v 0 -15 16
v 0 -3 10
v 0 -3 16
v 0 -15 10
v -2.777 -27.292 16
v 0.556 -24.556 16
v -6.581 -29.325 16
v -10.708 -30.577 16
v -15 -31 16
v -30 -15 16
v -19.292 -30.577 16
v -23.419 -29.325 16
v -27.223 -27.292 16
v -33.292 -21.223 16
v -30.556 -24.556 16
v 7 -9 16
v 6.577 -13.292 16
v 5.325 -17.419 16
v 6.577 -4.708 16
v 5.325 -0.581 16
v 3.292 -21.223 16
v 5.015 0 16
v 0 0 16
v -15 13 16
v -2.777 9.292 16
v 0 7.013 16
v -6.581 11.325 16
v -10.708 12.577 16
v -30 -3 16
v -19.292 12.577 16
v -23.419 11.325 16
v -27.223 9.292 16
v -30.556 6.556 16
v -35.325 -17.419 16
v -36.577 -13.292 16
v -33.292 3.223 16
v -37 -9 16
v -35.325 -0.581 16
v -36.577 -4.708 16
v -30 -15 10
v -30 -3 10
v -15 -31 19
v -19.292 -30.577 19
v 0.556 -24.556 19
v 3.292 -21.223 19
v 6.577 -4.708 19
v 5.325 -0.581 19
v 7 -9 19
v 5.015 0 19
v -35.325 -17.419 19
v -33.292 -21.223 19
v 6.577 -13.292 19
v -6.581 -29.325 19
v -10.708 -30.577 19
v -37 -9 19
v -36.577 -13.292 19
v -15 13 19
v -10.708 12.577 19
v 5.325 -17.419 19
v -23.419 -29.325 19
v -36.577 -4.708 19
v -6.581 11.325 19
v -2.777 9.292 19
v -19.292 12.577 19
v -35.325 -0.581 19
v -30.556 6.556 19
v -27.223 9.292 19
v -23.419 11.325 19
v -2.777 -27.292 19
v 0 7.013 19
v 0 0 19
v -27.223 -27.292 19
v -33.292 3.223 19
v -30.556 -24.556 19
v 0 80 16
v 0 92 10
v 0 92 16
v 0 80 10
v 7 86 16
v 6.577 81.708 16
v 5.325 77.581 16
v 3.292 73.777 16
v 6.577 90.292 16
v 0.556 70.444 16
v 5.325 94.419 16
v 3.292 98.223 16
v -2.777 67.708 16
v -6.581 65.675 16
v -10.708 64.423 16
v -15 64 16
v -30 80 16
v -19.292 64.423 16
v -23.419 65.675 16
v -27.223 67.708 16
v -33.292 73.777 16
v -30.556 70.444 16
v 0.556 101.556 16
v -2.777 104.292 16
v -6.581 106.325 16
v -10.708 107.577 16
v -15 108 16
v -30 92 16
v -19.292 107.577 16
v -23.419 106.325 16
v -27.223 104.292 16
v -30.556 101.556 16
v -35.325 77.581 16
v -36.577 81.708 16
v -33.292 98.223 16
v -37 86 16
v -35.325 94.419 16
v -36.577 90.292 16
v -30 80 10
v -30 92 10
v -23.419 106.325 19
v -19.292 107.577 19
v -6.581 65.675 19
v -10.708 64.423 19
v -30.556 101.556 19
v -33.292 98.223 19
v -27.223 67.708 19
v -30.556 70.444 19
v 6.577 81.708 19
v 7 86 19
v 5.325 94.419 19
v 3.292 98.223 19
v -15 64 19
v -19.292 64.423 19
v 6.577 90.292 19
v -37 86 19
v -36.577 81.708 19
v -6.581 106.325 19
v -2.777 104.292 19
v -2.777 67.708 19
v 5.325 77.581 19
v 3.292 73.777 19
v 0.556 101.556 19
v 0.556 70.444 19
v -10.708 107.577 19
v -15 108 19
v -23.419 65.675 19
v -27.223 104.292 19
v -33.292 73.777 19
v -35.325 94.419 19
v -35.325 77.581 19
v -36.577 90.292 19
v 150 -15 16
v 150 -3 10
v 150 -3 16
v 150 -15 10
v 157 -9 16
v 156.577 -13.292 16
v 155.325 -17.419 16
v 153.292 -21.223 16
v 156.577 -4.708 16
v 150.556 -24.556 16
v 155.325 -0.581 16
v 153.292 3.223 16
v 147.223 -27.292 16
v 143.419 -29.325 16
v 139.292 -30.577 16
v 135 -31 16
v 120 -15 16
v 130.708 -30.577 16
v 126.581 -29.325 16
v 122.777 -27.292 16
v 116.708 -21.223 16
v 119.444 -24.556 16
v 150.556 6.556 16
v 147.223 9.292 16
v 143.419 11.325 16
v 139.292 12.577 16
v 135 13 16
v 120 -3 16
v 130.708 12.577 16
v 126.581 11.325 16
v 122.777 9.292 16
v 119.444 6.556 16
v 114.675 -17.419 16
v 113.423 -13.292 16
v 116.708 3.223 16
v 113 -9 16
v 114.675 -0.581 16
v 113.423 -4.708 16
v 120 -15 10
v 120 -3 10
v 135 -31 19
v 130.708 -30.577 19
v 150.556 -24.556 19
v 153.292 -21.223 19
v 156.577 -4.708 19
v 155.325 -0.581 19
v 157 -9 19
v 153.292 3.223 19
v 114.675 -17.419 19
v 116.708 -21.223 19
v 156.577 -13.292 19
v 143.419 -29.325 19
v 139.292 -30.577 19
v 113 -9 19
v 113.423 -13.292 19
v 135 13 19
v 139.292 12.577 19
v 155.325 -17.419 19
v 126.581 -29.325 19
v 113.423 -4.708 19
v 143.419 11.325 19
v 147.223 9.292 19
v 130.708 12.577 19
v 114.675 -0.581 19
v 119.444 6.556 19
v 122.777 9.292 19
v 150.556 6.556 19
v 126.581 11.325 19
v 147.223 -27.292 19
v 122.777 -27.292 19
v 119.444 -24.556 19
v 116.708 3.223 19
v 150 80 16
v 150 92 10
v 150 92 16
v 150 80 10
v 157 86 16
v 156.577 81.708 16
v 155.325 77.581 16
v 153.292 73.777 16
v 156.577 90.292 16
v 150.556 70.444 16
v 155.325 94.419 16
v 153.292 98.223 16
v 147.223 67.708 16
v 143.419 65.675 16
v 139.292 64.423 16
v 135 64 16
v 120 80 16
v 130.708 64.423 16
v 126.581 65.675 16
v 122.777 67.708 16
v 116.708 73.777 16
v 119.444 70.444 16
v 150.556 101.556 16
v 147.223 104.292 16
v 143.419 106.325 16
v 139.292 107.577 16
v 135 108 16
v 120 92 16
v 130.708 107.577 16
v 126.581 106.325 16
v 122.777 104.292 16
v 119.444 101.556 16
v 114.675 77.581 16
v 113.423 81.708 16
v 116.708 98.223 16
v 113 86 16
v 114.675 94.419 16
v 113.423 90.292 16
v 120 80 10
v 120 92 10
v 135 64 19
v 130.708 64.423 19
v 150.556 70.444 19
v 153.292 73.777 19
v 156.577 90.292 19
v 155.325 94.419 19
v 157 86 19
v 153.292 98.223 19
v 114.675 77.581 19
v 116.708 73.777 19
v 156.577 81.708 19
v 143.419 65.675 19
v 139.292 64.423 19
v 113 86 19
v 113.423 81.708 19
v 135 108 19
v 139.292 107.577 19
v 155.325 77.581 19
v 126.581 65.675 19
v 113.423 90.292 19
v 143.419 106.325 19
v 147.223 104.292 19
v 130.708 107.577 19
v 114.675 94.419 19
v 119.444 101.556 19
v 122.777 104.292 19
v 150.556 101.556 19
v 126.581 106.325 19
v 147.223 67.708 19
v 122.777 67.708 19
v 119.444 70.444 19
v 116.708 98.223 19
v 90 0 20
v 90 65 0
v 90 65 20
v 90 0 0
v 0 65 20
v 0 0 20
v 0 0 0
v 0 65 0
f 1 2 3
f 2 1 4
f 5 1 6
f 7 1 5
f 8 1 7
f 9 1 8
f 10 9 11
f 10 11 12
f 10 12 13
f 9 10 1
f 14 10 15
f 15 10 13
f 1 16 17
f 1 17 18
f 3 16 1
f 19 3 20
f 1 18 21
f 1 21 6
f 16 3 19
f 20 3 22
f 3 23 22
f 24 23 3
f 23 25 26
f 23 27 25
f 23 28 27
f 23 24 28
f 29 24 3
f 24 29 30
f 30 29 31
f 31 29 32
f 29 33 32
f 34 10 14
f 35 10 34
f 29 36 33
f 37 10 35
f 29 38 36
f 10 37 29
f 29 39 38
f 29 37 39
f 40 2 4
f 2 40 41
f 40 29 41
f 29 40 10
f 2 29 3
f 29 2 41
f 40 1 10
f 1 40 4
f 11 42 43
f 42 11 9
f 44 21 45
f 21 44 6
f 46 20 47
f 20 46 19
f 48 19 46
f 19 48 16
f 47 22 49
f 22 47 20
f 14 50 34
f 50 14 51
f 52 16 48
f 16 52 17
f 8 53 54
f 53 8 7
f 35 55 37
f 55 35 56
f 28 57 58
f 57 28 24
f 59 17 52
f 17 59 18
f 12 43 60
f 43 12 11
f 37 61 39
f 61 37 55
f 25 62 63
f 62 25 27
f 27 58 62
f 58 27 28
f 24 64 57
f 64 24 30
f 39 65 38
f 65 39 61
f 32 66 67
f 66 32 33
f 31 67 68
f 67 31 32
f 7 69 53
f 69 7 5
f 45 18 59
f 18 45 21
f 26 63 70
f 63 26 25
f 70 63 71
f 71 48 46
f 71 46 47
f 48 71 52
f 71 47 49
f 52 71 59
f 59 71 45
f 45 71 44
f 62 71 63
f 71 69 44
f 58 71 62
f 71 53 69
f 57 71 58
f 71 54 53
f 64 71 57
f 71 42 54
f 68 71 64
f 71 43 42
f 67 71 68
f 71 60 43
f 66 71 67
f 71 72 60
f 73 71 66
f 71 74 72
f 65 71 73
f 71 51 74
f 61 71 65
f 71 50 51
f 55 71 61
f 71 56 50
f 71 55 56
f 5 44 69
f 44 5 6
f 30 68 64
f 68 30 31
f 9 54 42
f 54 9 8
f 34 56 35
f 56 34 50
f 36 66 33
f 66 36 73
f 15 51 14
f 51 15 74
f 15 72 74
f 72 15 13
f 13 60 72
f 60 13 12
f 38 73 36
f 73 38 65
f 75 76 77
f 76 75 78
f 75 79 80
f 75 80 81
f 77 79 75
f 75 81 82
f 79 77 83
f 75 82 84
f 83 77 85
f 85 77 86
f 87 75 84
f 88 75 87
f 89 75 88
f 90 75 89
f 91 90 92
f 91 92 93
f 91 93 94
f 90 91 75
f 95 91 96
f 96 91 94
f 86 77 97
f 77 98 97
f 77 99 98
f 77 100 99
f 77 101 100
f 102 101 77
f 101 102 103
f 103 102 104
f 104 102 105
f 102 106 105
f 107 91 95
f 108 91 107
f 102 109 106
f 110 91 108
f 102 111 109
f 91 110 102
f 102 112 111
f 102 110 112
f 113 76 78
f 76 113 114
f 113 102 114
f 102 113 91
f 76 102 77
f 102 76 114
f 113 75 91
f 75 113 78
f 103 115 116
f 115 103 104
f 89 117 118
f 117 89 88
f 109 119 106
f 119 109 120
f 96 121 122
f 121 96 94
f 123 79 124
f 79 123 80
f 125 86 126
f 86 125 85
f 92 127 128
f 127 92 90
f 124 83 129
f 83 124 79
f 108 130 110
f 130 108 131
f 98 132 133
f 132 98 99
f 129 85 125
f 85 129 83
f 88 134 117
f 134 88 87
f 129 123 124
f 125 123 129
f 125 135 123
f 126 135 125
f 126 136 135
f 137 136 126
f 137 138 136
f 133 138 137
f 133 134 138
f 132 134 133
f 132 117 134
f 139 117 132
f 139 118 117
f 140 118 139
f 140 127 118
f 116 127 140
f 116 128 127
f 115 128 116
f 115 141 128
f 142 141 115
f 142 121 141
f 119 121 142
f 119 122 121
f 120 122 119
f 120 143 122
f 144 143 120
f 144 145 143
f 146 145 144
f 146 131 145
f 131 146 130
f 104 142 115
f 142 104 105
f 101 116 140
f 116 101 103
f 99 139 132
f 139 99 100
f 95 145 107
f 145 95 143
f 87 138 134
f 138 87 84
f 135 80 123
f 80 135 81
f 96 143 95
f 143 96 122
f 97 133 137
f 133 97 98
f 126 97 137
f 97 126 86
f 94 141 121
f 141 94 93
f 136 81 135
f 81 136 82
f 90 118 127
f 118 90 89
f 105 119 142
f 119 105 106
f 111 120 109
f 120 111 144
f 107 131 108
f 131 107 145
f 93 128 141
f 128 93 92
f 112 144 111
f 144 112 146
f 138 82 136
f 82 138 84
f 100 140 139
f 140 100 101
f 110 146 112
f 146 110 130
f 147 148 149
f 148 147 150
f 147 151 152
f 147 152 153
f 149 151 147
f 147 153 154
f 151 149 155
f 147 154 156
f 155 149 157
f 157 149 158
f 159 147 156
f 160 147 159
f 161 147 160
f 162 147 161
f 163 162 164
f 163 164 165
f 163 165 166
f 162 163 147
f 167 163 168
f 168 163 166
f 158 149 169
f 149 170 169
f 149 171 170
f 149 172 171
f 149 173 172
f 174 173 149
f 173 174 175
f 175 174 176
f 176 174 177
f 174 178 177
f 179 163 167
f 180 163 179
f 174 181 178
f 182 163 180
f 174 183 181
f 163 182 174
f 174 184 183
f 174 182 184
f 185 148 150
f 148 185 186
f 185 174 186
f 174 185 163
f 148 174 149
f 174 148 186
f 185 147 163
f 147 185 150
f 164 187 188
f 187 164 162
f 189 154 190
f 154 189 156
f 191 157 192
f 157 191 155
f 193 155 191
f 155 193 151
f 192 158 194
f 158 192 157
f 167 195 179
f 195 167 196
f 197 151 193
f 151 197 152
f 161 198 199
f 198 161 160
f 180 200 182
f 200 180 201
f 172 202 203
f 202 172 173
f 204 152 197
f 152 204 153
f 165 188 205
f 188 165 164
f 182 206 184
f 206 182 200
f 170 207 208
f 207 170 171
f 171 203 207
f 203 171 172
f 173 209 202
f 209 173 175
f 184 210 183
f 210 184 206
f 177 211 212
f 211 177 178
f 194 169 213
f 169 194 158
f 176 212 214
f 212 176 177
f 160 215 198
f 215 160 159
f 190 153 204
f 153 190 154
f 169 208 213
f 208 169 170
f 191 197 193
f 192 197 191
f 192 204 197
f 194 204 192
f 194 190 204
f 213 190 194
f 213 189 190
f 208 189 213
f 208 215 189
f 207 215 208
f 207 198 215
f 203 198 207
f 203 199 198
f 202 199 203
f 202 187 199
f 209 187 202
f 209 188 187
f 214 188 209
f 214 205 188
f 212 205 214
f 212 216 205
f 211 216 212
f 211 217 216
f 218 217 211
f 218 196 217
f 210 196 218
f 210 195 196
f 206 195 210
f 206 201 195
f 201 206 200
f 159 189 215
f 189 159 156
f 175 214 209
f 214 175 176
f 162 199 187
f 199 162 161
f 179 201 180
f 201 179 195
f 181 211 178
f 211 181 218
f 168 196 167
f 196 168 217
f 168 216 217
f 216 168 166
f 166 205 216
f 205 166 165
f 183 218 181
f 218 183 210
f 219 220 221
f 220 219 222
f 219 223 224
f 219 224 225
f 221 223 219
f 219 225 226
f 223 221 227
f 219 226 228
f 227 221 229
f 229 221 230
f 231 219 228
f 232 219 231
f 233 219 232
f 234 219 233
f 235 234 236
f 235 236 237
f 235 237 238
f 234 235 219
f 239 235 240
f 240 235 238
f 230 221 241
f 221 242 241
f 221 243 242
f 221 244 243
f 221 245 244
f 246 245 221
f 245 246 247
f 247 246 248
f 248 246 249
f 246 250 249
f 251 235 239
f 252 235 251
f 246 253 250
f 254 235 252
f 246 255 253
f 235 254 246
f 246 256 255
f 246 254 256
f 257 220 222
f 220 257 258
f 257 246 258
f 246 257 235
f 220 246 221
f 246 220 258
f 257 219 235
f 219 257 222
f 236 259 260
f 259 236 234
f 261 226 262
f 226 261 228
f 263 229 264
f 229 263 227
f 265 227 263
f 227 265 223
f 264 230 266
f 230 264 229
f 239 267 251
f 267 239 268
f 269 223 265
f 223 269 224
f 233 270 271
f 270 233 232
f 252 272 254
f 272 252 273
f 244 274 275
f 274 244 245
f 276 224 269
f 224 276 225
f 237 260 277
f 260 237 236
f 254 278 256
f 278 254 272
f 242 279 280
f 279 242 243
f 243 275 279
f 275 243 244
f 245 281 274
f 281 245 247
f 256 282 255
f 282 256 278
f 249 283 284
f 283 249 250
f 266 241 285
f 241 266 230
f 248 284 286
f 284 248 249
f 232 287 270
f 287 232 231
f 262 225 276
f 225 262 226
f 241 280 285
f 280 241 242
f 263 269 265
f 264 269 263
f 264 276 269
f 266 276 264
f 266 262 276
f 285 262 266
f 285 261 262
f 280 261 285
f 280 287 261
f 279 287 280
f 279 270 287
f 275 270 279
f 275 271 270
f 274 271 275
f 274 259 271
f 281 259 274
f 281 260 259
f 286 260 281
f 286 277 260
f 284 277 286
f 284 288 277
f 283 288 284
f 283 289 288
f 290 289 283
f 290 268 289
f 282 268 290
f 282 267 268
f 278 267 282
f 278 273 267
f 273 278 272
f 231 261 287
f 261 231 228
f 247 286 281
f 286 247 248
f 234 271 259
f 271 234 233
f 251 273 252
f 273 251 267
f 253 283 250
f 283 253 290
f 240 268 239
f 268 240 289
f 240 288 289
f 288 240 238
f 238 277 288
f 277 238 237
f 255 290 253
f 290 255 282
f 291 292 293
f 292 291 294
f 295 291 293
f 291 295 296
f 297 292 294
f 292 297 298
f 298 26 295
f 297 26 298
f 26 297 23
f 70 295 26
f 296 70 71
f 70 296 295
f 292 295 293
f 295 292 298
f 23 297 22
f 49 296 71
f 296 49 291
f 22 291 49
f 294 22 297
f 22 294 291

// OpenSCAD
// Concept only. Provisional dimensions in mm.
$fn=32;
cube([90,65,20]);for(x=[-30,120])for(y=[-15,80])translate([x,y,10]){cube([30,12,6]);translate([15,6,6])cylinder(h=3,r=22);}
